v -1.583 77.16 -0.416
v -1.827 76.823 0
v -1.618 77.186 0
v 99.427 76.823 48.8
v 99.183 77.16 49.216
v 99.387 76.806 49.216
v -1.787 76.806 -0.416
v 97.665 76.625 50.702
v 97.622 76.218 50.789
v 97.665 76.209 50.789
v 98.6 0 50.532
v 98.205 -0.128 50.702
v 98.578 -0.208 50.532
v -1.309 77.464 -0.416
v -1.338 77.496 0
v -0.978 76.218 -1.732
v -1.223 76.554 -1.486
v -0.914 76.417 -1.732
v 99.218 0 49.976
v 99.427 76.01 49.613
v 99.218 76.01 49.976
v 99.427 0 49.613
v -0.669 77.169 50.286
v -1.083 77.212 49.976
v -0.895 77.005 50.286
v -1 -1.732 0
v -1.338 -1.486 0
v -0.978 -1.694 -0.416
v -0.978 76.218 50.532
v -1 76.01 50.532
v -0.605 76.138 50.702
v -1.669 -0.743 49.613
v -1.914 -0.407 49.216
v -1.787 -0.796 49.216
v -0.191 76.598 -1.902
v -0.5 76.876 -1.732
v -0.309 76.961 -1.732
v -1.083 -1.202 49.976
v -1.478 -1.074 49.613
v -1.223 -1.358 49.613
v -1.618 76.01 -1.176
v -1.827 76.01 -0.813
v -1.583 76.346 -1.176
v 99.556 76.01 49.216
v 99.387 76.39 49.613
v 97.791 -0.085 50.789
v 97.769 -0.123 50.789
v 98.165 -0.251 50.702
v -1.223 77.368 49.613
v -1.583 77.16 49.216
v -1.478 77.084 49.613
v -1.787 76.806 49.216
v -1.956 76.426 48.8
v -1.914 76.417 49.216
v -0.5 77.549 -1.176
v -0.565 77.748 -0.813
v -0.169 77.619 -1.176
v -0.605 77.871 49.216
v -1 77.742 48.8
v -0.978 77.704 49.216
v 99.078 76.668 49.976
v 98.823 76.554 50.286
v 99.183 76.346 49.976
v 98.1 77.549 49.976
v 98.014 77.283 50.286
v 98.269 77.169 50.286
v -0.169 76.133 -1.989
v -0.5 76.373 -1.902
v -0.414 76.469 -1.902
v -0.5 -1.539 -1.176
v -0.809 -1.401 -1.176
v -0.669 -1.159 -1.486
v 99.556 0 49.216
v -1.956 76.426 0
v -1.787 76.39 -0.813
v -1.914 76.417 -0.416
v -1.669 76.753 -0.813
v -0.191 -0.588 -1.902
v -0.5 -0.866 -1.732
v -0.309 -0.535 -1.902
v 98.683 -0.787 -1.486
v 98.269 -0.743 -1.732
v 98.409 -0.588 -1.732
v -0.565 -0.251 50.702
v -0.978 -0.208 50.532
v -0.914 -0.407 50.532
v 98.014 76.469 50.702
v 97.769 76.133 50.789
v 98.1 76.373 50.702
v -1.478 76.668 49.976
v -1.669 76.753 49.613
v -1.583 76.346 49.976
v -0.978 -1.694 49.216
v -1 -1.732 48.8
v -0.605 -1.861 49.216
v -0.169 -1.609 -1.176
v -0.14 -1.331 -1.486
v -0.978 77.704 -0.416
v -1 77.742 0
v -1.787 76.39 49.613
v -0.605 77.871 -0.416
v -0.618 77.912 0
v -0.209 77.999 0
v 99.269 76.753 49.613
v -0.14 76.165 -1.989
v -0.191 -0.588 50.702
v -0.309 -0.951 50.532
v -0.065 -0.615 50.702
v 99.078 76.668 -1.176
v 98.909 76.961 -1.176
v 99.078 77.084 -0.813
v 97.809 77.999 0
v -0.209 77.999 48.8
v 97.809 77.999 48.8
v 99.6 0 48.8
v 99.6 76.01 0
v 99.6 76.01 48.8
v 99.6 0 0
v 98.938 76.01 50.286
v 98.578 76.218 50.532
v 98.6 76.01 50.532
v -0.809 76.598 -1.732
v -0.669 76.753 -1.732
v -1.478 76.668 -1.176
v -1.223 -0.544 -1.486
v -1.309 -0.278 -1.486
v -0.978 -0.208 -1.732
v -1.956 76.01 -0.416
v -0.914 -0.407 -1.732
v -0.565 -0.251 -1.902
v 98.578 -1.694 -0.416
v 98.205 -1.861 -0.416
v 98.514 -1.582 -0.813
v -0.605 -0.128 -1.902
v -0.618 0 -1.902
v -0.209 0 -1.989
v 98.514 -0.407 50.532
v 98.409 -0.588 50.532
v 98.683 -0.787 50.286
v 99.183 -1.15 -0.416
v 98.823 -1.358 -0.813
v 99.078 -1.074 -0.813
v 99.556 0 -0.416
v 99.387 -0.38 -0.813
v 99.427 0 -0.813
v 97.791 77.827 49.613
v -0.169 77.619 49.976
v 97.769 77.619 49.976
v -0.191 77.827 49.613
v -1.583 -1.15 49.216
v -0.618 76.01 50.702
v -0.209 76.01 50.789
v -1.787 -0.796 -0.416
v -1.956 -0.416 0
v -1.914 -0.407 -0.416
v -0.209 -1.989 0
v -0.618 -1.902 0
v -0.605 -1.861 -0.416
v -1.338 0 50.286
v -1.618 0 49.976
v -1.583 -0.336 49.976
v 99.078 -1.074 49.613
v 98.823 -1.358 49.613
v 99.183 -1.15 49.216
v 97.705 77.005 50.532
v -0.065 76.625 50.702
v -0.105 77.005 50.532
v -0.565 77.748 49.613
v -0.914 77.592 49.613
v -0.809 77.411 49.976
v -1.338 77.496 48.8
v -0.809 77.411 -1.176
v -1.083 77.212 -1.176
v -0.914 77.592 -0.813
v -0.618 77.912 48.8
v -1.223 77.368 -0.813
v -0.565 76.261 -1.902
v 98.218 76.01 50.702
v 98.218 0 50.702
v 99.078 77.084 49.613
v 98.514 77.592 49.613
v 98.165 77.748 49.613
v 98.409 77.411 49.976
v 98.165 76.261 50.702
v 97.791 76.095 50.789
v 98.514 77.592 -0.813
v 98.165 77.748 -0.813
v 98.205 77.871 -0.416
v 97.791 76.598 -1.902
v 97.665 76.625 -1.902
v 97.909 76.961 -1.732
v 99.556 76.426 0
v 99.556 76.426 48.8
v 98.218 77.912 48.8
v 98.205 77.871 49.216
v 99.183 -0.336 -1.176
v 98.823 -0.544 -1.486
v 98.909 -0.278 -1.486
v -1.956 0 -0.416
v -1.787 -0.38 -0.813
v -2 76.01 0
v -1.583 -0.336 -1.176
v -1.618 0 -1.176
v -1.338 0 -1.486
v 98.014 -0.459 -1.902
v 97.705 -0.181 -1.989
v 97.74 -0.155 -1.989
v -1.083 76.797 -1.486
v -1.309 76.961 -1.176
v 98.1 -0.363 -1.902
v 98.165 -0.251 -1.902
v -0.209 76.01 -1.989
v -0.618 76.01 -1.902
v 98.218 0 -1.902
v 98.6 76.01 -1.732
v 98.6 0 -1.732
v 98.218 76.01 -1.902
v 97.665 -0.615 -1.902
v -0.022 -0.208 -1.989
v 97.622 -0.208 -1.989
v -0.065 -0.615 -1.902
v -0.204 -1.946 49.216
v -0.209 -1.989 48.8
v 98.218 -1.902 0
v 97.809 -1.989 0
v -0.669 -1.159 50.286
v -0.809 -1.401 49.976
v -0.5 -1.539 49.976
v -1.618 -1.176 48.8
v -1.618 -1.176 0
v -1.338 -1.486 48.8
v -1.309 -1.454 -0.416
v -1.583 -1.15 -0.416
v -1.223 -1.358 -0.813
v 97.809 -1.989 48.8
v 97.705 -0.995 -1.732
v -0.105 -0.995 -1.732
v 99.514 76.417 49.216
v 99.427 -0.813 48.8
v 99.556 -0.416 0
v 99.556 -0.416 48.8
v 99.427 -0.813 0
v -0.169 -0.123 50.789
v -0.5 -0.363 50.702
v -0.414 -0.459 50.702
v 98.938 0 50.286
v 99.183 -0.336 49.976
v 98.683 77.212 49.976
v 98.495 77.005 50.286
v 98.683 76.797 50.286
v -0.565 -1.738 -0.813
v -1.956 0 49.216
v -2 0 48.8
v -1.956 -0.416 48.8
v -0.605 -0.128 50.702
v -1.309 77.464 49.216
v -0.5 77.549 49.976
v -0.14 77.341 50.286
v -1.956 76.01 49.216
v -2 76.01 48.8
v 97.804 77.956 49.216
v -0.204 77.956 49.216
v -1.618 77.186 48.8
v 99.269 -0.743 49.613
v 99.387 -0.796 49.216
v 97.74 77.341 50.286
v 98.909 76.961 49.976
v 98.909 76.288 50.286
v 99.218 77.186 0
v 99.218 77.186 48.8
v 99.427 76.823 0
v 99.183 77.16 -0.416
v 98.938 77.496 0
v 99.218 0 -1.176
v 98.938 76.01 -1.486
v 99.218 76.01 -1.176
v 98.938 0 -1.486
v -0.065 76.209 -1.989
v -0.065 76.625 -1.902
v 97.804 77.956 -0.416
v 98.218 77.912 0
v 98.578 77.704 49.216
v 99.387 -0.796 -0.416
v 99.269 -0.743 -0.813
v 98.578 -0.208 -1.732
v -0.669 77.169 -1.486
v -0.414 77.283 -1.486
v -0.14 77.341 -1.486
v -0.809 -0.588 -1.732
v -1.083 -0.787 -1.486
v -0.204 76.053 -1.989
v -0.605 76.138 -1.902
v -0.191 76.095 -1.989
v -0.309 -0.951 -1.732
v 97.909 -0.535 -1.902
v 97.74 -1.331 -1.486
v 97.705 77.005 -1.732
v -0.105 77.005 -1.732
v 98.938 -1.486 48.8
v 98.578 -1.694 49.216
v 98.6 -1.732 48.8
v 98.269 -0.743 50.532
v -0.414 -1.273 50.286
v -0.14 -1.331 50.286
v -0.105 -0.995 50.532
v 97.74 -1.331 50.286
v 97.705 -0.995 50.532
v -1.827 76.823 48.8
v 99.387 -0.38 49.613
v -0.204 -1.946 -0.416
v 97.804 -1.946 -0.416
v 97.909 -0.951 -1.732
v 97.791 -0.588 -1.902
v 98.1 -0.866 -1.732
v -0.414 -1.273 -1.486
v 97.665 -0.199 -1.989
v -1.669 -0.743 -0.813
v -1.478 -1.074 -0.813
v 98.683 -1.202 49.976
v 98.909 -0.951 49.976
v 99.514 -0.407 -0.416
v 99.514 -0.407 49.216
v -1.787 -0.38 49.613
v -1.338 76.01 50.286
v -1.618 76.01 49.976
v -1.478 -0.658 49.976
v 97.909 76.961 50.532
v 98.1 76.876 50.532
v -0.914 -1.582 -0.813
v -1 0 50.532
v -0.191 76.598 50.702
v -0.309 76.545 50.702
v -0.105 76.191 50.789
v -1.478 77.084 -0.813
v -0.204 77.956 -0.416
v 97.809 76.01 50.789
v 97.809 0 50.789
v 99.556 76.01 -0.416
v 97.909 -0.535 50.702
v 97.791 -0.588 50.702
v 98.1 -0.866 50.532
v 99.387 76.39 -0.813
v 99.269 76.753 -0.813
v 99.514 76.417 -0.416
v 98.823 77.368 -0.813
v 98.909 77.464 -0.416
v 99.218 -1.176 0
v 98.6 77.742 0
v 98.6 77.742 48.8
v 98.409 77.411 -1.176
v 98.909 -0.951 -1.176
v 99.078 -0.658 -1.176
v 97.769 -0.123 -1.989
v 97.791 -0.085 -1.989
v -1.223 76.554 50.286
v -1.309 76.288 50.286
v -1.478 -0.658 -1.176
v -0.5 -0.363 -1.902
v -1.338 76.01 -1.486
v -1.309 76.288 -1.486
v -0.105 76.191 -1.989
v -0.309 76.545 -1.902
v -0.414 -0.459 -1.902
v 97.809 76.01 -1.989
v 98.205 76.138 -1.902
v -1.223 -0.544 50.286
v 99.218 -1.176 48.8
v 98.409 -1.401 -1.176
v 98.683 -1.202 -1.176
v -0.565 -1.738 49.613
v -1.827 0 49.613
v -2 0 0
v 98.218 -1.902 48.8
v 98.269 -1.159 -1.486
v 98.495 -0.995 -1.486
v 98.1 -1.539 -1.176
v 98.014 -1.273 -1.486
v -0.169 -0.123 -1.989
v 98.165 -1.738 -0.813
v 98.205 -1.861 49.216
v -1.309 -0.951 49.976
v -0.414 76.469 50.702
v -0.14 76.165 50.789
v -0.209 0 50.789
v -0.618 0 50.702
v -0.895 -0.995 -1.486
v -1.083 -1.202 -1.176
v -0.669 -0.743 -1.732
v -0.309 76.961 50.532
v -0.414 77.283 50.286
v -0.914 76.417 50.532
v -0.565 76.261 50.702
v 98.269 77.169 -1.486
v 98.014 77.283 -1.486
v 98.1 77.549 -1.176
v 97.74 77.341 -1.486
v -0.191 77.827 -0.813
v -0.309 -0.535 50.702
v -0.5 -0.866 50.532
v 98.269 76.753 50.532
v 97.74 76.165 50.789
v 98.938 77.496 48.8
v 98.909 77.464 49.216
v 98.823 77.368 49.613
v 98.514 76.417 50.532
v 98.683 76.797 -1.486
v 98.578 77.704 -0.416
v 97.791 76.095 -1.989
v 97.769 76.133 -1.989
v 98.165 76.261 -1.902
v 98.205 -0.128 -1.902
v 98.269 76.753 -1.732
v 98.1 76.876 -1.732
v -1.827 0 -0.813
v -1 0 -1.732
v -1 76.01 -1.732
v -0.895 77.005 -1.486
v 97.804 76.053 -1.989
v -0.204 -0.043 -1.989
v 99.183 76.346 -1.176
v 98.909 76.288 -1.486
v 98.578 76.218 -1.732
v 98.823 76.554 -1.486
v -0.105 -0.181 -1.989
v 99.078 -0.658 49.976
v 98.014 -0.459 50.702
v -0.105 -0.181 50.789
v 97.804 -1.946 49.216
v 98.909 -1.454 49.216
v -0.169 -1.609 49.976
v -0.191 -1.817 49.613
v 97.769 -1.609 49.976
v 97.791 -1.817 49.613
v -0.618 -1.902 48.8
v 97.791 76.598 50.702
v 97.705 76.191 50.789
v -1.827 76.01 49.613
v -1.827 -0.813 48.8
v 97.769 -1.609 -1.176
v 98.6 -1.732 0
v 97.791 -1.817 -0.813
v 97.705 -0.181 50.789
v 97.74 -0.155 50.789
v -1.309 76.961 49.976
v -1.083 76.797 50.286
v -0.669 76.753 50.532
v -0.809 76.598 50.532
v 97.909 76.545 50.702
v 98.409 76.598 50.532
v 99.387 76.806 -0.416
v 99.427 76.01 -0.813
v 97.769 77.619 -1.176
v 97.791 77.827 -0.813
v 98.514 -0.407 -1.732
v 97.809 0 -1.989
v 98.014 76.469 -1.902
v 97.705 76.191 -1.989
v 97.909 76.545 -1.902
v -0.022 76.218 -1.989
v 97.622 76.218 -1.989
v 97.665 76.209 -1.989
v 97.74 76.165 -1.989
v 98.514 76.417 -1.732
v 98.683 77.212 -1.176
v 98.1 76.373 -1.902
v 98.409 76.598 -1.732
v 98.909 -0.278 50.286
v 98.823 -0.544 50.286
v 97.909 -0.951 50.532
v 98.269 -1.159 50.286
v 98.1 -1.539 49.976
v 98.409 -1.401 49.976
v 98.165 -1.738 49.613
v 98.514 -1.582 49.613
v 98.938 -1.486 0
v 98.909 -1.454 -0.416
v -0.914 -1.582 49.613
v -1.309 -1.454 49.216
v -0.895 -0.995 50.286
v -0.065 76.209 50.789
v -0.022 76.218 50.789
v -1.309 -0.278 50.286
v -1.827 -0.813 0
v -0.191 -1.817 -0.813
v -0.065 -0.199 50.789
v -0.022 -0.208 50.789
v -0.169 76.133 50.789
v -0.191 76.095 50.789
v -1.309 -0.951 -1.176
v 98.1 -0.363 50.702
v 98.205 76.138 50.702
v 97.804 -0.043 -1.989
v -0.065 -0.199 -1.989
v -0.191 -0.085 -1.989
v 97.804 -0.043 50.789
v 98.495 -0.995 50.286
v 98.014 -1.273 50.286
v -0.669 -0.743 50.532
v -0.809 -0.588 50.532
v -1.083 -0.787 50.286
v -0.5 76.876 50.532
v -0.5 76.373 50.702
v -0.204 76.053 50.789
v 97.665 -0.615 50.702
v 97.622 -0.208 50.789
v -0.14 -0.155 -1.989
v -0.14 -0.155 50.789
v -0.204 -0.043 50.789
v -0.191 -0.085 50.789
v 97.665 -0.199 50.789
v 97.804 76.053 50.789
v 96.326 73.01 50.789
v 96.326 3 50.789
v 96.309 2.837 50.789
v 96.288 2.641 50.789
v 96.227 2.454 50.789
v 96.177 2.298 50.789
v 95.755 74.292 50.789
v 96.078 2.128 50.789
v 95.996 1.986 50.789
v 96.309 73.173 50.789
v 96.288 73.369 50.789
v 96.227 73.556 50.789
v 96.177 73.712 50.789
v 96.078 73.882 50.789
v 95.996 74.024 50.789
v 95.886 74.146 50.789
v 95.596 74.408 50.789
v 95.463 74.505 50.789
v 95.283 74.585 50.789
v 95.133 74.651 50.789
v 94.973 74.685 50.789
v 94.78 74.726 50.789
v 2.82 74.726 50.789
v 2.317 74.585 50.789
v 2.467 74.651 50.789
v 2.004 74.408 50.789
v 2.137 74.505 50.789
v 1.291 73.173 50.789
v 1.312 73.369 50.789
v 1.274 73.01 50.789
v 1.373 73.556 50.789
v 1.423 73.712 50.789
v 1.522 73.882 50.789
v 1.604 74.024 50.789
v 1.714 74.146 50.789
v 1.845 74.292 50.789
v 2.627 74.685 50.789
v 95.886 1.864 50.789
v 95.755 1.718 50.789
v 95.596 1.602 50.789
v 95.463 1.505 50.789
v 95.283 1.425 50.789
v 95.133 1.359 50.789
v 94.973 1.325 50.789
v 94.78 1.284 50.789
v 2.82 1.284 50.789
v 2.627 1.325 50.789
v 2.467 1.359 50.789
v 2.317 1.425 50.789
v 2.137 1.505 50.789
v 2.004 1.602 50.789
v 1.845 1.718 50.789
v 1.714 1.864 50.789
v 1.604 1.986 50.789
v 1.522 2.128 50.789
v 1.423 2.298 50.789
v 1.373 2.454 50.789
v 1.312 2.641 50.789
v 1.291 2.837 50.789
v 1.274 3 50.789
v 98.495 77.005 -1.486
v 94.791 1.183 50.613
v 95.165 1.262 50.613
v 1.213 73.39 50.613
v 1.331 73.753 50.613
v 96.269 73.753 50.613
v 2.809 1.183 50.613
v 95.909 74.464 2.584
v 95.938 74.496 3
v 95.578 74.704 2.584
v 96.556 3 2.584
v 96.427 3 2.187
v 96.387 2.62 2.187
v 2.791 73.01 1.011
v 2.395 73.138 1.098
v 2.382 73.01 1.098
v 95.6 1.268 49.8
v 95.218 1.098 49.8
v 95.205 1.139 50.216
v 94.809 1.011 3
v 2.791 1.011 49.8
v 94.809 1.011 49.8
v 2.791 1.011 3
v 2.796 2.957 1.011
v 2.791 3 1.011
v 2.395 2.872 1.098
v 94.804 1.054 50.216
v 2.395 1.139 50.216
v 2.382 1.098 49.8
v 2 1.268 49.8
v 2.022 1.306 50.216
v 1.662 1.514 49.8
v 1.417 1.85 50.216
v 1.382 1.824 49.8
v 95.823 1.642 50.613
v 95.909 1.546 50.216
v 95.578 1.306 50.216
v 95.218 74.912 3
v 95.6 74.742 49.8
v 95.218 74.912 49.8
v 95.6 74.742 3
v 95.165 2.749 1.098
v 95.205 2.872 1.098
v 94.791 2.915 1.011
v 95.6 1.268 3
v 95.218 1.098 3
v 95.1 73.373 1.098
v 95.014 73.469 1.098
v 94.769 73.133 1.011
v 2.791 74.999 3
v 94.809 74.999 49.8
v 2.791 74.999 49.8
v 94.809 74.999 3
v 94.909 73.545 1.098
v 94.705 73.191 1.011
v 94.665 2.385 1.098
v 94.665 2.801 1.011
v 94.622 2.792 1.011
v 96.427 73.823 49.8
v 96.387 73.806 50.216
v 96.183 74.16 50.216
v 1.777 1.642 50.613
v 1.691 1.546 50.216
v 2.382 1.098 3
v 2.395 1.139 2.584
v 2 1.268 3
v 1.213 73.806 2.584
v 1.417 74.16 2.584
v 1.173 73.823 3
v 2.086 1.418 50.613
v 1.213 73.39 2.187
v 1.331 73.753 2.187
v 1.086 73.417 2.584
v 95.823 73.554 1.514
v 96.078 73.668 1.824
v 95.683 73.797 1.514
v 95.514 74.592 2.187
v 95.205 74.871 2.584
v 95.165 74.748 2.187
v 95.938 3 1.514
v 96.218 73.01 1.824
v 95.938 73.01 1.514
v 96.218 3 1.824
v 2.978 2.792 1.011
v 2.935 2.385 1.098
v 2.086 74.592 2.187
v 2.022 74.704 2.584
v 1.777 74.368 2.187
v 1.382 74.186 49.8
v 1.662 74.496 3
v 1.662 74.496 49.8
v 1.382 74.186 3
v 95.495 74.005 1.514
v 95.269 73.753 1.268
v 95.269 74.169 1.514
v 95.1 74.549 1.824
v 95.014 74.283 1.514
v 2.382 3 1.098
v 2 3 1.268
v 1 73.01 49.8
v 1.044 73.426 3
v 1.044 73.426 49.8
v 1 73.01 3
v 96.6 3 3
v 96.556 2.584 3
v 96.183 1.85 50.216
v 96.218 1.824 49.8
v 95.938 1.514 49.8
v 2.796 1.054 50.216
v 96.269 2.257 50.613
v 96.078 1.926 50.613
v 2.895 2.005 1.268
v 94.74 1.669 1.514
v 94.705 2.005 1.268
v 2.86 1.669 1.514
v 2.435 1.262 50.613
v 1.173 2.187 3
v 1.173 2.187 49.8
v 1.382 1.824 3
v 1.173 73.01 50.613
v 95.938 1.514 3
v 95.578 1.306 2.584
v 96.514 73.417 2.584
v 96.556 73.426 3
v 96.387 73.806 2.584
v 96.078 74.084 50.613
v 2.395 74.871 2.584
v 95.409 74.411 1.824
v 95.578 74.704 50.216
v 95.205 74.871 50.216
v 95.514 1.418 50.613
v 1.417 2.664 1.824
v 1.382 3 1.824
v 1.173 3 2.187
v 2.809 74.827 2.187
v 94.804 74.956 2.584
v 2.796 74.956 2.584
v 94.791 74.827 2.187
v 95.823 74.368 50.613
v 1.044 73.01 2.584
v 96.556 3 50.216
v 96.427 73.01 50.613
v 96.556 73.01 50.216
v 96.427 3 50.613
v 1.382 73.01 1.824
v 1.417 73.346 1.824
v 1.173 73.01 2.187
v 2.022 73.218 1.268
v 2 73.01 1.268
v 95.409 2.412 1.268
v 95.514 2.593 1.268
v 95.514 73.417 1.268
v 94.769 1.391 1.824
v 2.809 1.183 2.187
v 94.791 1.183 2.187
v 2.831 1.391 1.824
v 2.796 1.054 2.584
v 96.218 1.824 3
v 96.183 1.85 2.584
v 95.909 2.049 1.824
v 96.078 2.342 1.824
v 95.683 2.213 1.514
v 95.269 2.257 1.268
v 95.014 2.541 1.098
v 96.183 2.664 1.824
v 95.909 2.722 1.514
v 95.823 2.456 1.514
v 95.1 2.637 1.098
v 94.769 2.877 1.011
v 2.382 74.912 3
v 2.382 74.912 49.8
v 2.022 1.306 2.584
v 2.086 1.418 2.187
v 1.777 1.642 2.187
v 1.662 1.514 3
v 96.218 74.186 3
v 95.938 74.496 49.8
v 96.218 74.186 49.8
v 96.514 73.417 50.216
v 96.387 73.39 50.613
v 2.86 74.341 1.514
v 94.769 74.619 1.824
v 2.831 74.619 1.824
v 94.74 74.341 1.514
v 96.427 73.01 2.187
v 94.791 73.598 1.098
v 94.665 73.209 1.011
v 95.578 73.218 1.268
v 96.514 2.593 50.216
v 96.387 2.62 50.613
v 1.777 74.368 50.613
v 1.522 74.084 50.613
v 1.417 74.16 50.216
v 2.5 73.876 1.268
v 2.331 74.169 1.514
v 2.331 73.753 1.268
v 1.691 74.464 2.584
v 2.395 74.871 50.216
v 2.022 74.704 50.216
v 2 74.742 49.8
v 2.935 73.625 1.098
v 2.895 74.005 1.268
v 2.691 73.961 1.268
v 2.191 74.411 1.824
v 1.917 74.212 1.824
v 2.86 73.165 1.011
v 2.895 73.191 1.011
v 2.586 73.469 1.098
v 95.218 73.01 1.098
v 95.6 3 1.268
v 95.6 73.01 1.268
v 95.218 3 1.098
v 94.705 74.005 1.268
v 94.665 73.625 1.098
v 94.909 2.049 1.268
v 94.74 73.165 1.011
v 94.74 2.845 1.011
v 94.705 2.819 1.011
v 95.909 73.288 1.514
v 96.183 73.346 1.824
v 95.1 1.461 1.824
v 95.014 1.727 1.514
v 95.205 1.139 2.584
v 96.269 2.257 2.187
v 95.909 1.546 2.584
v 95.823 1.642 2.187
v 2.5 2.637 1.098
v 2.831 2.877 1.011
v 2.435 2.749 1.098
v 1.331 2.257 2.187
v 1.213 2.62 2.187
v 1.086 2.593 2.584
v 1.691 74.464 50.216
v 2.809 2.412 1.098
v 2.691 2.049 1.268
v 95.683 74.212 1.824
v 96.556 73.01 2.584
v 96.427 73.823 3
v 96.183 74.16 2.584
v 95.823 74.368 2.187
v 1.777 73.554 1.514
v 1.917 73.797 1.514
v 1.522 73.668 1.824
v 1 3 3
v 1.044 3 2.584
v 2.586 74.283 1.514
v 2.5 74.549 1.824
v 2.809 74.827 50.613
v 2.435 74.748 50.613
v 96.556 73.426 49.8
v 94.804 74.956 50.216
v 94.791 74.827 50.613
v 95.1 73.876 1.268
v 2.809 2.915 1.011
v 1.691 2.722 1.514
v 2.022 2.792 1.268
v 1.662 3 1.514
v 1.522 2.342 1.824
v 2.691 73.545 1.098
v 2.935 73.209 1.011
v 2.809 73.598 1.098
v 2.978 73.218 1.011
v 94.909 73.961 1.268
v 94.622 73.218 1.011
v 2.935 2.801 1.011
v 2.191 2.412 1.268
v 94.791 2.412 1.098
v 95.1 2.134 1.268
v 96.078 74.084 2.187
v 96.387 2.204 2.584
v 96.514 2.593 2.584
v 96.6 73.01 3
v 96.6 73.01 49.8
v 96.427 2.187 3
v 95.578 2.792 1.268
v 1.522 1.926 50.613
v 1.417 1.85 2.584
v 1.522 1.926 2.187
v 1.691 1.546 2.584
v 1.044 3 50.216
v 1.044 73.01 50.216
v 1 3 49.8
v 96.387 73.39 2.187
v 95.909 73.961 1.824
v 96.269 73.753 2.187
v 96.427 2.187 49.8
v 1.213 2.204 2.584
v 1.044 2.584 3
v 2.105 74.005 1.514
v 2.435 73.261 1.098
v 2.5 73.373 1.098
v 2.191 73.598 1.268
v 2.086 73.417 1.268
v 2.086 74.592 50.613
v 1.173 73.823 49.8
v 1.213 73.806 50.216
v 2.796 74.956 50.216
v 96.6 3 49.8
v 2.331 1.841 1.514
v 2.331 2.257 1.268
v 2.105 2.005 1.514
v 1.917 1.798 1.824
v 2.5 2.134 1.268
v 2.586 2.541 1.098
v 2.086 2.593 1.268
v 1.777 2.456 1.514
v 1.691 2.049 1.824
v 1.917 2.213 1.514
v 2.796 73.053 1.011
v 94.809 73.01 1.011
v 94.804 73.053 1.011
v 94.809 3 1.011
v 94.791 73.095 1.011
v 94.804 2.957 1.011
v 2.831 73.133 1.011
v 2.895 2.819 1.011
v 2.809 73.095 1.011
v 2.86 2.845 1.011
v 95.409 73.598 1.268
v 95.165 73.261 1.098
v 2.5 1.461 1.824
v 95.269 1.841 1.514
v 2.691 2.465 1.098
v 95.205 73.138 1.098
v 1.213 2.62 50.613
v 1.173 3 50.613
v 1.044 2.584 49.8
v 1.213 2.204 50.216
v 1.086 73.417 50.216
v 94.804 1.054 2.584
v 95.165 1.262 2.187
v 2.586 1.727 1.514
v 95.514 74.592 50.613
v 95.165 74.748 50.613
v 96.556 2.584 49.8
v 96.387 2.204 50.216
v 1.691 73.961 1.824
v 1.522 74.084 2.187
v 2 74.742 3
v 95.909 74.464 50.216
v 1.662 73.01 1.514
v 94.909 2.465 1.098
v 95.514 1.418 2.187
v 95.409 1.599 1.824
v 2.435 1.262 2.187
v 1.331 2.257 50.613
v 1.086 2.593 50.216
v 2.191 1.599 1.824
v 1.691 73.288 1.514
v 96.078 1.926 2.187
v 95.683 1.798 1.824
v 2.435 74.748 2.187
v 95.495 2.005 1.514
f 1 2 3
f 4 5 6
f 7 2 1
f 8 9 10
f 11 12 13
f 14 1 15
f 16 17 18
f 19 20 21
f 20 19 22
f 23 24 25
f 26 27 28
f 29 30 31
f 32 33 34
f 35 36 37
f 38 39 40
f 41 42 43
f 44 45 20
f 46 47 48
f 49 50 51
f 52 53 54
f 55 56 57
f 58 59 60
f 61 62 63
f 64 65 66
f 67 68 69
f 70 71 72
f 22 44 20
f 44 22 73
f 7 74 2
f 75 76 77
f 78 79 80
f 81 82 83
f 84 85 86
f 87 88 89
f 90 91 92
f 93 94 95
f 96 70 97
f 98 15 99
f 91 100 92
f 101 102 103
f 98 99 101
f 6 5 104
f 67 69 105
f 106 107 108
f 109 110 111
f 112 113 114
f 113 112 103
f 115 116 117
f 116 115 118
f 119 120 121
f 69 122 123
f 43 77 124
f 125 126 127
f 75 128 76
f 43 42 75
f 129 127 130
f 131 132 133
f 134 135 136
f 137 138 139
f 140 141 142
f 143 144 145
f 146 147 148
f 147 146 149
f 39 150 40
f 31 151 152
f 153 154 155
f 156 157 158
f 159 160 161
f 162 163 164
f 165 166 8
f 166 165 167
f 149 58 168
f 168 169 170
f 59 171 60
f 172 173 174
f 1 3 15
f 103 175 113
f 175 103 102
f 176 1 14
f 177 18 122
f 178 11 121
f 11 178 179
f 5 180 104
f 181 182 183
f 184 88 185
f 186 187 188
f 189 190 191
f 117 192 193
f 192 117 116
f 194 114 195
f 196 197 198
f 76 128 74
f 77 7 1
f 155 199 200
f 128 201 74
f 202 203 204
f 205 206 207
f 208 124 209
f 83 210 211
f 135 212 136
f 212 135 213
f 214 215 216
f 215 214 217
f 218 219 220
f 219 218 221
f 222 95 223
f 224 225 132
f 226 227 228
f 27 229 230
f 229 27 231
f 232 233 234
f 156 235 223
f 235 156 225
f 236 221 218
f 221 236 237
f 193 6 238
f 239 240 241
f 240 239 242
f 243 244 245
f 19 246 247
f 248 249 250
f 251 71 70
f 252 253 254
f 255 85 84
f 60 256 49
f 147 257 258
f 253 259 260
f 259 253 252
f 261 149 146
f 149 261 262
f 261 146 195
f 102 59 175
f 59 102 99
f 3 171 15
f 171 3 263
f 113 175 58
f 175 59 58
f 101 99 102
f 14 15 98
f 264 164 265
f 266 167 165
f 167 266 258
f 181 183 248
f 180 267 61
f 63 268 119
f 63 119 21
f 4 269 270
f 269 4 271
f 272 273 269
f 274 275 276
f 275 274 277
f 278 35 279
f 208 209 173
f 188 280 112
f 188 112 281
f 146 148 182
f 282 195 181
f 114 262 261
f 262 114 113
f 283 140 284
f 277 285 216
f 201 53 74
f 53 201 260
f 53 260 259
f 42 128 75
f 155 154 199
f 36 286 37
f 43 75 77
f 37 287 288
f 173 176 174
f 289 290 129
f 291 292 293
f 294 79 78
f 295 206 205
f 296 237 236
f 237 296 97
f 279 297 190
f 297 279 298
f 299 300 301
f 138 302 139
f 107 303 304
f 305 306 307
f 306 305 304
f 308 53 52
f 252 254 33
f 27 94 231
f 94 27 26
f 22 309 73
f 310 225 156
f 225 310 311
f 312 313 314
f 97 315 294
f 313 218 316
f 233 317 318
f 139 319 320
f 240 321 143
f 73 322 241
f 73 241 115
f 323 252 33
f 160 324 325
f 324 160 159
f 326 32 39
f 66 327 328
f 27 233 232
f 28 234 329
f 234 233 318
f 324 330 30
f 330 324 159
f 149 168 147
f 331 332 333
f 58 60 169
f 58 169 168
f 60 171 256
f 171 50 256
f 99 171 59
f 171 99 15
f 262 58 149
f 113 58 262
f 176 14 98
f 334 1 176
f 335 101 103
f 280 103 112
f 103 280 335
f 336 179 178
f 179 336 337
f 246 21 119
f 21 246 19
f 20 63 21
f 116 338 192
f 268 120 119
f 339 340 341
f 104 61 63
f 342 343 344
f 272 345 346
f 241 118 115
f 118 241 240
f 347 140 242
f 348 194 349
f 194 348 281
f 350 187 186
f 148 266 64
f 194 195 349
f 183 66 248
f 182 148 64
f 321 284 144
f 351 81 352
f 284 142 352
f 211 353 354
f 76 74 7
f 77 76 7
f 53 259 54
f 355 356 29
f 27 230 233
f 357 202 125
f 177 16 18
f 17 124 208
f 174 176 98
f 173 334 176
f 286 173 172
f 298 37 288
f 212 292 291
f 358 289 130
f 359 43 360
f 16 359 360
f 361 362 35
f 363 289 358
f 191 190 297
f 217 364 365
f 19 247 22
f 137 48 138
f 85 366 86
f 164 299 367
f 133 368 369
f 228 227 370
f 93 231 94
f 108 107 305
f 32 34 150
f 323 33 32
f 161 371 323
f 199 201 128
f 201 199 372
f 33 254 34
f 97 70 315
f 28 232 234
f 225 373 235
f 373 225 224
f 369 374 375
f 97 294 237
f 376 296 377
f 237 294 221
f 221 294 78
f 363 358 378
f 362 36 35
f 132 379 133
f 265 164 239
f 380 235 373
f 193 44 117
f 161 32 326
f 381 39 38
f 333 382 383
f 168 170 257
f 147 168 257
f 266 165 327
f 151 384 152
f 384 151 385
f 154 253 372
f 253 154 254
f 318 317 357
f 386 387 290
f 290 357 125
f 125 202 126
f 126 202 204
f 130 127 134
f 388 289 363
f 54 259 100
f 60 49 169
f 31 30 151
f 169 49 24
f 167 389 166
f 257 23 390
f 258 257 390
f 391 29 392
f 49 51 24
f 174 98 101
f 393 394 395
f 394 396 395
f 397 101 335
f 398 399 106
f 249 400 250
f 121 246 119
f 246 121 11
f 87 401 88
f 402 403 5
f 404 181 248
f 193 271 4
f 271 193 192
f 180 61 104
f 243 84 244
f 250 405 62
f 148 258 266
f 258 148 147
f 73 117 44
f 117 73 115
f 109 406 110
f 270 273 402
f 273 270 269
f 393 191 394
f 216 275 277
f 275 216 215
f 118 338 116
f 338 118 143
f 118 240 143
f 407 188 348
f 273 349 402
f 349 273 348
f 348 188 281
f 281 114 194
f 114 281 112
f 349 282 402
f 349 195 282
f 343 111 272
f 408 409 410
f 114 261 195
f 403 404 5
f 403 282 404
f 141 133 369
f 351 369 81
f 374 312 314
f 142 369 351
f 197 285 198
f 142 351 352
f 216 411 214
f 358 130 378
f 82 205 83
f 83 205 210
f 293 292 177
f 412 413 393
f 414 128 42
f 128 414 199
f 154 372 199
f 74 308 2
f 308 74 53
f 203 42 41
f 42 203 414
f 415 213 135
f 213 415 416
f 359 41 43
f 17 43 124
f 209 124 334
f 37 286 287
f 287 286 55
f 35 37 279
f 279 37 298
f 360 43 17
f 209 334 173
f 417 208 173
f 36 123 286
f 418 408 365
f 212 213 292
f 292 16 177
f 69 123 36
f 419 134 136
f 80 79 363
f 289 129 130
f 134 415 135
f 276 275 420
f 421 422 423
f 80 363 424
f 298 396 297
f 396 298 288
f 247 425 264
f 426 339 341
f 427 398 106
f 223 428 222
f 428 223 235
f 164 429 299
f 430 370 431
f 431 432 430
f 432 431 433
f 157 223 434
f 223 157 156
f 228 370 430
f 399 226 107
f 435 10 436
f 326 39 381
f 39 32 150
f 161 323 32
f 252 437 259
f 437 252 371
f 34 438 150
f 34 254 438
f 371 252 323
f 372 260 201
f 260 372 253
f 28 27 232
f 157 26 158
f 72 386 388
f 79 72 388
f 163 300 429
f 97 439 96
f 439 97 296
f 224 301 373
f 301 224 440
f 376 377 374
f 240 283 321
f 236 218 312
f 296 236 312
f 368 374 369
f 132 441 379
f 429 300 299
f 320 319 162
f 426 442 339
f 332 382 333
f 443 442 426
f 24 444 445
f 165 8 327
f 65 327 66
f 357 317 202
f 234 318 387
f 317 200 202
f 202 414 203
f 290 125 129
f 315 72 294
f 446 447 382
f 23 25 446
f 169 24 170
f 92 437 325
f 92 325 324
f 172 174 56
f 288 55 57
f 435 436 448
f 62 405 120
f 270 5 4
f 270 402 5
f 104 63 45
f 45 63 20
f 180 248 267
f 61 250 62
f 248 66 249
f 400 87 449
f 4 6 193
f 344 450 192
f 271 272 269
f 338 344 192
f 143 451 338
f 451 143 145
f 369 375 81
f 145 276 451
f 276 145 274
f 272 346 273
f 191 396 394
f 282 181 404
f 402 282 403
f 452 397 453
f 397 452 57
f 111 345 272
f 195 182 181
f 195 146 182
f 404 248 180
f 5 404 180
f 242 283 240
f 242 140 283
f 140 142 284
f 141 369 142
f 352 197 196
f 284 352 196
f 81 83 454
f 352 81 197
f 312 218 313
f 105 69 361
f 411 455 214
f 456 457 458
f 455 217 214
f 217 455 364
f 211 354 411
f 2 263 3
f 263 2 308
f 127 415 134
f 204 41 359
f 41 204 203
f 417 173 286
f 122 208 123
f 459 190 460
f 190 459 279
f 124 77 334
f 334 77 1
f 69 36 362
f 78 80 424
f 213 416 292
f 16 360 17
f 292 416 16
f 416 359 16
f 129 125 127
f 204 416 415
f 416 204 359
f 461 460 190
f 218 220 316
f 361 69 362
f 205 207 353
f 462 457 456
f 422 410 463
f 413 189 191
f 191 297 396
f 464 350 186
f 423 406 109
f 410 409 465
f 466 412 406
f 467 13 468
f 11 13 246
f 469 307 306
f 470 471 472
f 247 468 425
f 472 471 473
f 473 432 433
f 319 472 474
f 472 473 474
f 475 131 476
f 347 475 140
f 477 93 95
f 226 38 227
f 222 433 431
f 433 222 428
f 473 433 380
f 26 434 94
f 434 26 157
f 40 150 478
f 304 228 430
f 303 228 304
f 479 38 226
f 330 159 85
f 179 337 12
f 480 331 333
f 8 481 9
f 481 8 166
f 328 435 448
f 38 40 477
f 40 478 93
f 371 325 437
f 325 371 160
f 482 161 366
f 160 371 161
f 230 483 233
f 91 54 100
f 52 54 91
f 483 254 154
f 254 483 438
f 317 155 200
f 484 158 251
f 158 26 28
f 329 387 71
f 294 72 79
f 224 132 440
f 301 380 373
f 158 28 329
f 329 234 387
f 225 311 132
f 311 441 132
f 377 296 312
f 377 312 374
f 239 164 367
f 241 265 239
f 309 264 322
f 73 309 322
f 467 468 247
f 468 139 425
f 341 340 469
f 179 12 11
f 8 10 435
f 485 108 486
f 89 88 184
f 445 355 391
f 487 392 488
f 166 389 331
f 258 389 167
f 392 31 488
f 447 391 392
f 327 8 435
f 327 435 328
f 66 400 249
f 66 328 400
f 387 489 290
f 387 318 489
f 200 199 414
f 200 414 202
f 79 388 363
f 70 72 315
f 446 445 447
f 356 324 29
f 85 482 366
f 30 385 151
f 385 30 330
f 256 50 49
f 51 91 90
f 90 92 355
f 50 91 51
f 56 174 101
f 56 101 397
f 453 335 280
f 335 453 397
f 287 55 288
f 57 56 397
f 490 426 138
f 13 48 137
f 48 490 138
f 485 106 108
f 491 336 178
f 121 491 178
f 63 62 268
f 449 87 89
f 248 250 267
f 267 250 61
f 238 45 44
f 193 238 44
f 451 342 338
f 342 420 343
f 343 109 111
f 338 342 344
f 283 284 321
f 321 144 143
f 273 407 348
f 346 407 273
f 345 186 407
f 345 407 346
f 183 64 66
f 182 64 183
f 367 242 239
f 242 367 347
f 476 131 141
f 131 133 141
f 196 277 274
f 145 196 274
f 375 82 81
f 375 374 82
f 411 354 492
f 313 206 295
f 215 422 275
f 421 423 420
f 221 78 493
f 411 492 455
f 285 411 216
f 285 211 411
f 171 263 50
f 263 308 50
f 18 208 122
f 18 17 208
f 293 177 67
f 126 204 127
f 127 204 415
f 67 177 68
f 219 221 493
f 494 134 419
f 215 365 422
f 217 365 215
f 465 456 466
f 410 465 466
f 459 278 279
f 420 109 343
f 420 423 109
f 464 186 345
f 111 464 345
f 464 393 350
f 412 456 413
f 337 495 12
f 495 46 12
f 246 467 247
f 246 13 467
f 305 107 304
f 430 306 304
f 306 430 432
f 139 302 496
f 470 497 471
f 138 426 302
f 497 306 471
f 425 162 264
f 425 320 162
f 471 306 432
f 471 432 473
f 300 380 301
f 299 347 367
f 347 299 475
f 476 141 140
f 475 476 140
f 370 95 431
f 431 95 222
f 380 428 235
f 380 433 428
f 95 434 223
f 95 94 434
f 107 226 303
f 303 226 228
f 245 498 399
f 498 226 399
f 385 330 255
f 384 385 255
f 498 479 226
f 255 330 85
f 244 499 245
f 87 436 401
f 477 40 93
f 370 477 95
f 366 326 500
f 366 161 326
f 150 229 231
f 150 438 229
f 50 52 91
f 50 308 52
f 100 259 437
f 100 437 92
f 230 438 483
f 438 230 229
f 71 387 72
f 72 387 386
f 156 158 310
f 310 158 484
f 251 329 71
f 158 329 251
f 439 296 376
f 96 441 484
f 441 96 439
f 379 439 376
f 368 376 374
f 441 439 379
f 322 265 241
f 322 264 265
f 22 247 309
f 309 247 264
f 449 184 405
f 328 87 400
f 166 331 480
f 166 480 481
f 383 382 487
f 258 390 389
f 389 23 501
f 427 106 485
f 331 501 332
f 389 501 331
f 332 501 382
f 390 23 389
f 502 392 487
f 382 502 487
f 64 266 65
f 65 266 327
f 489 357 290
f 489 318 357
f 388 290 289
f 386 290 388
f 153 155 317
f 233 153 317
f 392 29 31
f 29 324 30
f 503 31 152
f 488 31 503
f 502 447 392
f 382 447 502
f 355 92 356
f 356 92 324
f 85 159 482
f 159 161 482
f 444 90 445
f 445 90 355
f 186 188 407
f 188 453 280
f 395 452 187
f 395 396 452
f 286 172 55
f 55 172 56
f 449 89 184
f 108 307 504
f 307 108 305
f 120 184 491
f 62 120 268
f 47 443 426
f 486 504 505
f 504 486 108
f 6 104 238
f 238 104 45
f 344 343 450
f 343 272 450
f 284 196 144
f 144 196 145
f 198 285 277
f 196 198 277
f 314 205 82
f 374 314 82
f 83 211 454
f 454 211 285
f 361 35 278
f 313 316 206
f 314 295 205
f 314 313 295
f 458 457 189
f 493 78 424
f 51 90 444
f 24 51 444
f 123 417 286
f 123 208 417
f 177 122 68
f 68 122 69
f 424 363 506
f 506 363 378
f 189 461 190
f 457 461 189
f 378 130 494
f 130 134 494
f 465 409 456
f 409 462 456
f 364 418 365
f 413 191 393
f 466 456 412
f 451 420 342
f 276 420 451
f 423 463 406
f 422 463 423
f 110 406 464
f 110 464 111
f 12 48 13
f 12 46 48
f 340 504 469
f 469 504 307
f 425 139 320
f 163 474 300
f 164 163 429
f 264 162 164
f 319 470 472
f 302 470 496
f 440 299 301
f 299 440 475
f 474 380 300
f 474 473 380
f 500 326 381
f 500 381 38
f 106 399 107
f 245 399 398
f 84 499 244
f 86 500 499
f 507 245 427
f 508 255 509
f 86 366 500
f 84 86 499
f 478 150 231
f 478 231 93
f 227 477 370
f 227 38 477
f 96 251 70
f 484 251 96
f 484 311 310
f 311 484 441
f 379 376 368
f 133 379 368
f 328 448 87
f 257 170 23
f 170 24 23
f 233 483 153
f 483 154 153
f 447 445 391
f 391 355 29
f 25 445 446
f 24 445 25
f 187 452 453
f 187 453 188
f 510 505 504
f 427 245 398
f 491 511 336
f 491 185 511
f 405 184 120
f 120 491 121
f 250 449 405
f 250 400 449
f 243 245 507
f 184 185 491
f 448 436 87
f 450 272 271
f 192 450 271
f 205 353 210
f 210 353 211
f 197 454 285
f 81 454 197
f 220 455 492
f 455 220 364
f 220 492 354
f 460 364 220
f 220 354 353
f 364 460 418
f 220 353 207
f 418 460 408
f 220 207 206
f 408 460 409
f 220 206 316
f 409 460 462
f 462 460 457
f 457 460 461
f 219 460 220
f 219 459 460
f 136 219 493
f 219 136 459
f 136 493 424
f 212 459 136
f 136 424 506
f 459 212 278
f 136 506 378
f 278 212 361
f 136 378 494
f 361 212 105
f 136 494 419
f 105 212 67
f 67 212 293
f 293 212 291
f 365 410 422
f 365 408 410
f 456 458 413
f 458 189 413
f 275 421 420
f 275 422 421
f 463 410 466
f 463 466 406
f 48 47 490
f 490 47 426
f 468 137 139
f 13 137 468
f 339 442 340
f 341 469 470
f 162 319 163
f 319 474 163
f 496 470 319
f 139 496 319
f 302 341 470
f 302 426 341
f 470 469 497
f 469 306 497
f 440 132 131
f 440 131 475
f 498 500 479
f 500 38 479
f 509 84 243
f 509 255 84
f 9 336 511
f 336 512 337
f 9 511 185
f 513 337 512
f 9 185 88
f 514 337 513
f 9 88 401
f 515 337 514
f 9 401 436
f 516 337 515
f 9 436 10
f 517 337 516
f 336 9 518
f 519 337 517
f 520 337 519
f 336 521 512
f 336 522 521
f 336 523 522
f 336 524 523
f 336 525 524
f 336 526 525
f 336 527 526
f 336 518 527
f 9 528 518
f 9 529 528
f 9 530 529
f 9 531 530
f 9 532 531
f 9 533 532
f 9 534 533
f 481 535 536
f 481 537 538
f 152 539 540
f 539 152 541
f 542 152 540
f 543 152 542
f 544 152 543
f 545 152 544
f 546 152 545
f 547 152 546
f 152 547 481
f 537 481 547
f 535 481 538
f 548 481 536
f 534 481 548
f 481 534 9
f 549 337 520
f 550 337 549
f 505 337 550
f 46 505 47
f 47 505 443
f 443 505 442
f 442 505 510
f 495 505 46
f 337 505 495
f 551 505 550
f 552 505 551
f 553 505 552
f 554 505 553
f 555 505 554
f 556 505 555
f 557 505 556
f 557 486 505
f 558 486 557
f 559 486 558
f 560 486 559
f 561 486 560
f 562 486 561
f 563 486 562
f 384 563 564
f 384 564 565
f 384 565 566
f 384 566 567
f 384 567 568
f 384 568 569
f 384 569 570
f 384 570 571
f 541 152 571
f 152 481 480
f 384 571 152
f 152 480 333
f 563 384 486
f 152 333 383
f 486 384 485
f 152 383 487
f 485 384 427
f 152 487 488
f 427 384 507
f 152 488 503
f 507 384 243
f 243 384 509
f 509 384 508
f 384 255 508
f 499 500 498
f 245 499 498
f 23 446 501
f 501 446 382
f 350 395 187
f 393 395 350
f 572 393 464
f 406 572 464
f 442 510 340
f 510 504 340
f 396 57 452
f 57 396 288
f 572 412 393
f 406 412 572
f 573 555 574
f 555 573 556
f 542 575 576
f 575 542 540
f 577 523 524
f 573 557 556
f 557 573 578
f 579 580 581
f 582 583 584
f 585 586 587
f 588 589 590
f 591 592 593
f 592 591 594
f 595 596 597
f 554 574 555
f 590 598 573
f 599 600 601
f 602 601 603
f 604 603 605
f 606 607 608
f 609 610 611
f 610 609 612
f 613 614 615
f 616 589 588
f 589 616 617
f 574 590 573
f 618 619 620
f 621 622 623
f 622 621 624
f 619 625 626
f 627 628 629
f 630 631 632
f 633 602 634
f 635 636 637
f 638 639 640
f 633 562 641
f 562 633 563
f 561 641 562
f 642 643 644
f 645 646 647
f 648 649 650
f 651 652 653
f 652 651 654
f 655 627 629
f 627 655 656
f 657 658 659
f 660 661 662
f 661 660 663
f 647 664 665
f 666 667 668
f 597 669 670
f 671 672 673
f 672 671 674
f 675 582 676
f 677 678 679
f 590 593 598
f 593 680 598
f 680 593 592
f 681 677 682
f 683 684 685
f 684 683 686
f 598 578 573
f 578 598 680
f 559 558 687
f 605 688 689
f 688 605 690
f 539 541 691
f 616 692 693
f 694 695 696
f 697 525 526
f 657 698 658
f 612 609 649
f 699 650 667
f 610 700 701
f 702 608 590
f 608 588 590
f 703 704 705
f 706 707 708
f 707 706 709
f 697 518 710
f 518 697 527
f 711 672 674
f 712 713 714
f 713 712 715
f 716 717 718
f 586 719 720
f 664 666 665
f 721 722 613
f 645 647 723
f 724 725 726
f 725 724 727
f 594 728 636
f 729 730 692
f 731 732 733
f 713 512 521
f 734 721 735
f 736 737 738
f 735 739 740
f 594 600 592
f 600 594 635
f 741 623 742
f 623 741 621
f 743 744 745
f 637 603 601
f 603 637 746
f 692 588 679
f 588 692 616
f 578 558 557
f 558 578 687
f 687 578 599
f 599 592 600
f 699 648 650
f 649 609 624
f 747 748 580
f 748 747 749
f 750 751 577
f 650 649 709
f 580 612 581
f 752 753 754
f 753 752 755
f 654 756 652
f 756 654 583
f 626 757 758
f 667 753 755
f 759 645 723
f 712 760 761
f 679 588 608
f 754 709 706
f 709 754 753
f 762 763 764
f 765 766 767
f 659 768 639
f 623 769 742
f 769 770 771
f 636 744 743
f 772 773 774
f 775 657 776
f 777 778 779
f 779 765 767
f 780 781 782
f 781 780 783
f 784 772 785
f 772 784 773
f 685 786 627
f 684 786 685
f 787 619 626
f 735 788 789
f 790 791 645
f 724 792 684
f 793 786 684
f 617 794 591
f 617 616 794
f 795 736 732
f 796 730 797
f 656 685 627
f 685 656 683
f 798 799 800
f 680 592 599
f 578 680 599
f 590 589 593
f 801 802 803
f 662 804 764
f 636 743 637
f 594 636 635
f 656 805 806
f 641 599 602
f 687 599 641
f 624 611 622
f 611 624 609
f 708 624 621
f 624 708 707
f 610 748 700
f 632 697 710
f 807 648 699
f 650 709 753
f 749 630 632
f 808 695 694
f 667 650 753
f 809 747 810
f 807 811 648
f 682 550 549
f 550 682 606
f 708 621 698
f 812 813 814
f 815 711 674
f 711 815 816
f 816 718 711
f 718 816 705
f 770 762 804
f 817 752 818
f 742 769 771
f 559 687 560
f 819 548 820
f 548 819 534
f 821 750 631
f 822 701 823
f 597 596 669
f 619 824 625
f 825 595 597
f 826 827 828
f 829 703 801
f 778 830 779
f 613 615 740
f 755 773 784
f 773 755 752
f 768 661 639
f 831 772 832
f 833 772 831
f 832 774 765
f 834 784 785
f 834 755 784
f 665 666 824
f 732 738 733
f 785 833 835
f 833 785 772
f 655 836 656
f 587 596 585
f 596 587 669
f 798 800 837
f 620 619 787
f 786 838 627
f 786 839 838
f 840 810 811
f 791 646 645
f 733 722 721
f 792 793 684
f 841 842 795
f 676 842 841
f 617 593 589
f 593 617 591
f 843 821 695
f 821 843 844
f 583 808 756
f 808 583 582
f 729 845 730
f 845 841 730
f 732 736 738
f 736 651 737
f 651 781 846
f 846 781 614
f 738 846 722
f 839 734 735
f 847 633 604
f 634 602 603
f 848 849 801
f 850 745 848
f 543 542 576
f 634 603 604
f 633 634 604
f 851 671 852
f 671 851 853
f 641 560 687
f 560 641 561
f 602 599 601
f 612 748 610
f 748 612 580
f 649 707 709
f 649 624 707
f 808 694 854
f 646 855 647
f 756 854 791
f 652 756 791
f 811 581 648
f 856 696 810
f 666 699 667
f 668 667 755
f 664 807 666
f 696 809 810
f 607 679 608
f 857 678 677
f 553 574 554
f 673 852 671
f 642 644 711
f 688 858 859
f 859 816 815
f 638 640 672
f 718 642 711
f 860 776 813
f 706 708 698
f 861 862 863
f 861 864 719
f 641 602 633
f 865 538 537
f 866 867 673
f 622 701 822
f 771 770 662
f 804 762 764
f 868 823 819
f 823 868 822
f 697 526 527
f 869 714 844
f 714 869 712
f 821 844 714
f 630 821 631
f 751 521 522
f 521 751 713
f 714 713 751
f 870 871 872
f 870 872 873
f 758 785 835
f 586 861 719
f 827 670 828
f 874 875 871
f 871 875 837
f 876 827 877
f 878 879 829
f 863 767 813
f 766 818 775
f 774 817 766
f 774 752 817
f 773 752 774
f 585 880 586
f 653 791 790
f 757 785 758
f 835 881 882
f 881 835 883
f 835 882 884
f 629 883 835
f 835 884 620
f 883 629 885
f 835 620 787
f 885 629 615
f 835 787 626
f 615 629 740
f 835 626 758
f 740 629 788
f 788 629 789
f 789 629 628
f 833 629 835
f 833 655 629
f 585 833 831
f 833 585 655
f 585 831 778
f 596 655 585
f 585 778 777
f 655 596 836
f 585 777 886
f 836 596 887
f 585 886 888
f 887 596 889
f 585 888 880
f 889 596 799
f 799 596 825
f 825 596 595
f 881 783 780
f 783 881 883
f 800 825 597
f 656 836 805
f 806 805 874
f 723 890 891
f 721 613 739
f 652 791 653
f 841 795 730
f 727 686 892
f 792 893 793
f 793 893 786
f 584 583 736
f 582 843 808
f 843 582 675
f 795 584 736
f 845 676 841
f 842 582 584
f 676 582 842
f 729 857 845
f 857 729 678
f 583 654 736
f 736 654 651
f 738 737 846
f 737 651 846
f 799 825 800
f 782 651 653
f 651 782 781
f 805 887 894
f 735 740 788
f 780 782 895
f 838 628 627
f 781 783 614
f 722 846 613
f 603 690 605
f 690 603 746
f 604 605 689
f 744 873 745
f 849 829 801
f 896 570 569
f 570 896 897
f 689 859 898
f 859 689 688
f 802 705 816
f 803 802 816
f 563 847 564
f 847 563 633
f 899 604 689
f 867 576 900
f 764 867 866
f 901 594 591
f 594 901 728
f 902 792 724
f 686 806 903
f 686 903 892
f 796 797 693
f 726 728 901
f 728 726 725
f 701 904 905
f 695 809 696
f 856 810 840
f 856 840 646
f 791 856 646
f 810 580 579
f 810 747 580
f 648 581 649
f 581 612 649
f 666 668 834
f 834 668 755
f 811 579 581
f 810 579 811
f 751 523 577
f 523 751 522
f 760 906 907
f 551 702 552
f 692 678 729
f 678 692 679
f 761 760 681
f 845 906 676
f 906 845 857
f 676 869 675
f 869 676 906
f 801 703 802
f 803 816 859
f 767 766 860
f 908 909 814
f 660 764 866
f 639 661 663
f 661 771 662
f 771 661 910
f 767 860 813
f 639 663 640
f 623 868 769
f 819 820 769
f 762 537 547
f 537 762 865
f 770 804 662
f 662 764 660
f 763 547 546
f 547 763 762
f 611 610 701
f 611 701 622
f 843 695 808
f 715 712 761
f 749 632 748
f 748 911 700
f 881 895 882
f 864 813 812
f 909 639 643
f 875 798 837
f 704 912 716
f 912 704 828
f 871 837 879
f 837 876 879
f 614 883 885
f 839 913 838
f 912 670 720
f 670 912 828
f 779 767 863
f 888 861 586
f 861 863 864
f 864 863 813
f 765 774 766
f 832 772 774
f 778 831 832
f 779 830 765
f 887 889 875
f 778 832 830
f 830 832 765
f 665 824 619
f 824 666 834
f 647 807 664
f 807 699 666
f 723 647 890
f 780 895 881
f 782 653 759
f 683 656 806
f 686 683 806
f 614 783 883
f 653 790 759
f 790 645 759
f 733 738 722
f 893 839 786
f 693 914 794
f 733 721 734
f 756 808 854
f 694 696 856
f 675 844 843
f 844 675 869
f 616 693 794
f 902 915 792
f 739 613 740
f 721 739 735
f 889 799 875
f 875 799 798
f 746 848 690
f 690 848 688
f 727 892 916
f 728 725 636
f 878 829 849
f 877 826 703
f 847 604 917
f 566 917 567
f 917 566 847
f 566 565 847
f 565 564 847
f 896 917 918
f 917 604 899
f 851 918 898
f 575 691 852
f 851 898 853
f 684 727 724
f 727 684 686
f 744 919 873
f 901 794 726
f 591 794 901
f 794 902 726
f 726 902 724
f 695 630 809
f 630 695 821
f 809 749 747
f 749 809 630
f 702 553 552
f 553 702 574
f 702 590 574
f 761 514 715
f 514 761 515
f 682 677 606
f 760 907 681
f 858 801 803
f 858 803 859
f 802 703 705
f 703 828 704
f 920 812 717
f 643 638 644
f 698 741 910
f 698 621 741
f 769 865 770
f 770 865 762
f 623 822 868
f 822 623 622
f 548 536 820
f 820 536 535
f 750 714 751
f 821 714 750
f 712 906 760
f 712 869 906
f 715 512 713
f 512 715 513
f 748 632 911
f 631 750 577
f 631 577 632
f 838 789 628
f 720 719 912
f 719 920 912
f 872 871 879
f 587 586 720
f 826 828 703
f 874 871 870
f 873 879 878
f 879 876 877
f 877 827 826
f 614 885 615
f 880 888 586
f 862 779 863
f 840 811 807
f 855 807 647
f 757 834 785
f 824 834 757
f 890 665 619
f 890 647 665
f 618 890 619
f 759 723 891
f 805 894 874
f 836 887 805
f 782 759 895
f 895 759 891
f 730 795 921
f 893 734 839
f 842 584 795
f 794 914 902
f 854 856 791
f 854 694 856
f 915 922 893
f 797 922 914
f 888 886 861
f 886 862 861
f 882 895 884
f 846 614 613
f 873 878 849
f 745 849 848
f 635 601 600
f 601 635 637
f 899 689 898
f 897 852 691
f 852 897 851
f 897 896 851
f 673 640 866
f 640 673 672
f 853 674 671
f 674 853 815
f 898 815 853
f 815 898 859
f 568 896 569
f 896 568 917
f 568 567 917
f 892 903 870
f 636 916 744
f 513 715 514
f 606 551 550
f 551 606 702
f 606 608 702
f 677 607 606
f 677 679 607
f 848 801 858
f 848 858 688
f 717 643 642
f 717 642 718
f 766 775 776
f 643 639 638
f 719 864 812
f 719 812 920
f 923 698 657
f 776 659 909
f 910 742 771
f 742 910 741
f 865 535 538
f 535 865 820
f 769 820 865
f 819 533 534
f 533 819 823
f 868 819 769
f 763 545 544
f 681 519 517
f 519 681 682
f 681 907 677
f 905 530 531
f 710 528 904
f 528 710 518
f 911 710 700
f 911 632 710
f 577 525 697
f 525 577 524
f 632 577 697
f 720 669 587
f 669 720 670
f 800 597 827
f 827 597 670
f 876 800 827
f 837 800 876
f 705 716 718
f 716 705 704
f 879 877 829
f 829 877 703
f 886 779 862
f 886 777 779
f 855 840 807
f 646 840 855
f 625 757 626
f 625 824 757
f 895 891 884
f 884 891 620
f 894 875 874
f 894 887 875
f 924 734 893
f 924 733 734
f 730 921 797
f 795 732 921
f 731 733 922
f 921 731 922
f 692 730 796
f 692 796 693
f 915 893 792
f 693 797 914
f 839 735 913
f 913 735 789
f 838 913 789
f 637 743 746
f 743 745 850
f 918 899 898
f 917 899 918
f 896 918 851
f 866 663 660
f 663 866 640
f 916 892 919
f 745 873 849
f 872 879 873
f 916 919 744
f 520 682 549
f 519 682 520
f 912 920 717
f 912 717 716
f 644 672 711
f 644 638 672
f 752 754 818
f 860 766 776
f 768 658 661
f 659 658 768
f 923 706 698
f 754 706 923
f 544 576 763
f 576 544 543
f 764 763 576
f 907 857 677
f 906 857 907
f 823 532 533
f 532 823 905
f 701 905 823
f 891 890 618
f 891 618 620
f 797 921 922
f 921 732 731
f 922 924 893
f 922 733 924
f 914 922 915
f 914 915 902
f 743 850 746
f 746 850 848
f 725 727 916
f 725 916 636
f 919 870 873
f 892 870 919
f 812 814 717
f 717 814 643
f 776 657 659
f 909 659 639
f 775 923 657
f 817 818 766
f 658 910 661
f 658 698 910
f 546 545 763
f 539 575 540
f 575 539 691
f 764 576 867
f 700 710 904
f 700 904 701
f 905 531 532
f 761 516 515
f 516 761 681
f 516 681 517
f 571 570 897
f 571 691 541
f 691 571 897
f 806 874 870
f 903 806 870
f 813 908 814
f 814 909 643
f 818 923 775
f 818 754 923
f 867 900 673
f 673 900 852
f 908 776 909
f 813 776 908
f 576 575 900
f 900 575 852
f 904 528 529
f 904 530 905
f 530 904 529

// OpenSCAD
// Toolbox Drawer Organizer
// All dimensions in mm
// Build plate: 256 x 256 mm


// ===== CONFIGURABLE PARAMETERS =====

/* [External Dimensions] */
External_Width = 4; // .125
External_Depth = 3.15; // .125
External_Height = 2; // .125

/* [Thickness] */
Wall_Thickness = 3; // Wall thickness (mm)
Base_Thickness = 3; // Base thickness (mm)

/* [Corner Radius] */
Corner_Radius = 2; // Corner radius (mm)

// ===== CONVERT INCHES TO MM =====
calculated_bin_width = External_Width * 25.4;
calculated_bin_depth = External_Depth * 25.4;
calculated_bin_height = External_Height * 25.4;

// ==== CALCULATE INNER DIMENSIONS ====
calculated_inner_width = calculated_bin_width - (2 * Wall_Thickness); // Inner width (mm)
calculated_inner_depth = calculated_bin_depth - (2 * Wall_Thickness); // Inner depth (mm)
calculated_inner_height = calculated_bin_height - Base_Thickness; // Inner height (mm)


/* [Hidden] */
// Fragment count for smooth curves
$fn = 30; // Fragment count




// ===== MAIN ORGANIZER BIN =====
difference() {
    // Outer box with rounded corners using minkowski sum
    minkowski() {
        cube([calculated_bin_width - 2*Corner_Radius, calculated_bin_depth - 2*Corner_Radius, calculated_bin_height - Corner_Radius]);
        sphere(r=Corner_Radius);
    }
    
    // Inner cavity with rounded corners
    translate([Wall_Thickness, Wall_Thickness, Base_Thickness])
        minkowski() {
            cube([calculated_inner_width - 2*Corner_Radius, calculated_inner_depth - 2*Corner_Radius, calculated_inner_height - Corner_Radius + 1]);
            sphere(r=Corner_Radius);
        }
}
